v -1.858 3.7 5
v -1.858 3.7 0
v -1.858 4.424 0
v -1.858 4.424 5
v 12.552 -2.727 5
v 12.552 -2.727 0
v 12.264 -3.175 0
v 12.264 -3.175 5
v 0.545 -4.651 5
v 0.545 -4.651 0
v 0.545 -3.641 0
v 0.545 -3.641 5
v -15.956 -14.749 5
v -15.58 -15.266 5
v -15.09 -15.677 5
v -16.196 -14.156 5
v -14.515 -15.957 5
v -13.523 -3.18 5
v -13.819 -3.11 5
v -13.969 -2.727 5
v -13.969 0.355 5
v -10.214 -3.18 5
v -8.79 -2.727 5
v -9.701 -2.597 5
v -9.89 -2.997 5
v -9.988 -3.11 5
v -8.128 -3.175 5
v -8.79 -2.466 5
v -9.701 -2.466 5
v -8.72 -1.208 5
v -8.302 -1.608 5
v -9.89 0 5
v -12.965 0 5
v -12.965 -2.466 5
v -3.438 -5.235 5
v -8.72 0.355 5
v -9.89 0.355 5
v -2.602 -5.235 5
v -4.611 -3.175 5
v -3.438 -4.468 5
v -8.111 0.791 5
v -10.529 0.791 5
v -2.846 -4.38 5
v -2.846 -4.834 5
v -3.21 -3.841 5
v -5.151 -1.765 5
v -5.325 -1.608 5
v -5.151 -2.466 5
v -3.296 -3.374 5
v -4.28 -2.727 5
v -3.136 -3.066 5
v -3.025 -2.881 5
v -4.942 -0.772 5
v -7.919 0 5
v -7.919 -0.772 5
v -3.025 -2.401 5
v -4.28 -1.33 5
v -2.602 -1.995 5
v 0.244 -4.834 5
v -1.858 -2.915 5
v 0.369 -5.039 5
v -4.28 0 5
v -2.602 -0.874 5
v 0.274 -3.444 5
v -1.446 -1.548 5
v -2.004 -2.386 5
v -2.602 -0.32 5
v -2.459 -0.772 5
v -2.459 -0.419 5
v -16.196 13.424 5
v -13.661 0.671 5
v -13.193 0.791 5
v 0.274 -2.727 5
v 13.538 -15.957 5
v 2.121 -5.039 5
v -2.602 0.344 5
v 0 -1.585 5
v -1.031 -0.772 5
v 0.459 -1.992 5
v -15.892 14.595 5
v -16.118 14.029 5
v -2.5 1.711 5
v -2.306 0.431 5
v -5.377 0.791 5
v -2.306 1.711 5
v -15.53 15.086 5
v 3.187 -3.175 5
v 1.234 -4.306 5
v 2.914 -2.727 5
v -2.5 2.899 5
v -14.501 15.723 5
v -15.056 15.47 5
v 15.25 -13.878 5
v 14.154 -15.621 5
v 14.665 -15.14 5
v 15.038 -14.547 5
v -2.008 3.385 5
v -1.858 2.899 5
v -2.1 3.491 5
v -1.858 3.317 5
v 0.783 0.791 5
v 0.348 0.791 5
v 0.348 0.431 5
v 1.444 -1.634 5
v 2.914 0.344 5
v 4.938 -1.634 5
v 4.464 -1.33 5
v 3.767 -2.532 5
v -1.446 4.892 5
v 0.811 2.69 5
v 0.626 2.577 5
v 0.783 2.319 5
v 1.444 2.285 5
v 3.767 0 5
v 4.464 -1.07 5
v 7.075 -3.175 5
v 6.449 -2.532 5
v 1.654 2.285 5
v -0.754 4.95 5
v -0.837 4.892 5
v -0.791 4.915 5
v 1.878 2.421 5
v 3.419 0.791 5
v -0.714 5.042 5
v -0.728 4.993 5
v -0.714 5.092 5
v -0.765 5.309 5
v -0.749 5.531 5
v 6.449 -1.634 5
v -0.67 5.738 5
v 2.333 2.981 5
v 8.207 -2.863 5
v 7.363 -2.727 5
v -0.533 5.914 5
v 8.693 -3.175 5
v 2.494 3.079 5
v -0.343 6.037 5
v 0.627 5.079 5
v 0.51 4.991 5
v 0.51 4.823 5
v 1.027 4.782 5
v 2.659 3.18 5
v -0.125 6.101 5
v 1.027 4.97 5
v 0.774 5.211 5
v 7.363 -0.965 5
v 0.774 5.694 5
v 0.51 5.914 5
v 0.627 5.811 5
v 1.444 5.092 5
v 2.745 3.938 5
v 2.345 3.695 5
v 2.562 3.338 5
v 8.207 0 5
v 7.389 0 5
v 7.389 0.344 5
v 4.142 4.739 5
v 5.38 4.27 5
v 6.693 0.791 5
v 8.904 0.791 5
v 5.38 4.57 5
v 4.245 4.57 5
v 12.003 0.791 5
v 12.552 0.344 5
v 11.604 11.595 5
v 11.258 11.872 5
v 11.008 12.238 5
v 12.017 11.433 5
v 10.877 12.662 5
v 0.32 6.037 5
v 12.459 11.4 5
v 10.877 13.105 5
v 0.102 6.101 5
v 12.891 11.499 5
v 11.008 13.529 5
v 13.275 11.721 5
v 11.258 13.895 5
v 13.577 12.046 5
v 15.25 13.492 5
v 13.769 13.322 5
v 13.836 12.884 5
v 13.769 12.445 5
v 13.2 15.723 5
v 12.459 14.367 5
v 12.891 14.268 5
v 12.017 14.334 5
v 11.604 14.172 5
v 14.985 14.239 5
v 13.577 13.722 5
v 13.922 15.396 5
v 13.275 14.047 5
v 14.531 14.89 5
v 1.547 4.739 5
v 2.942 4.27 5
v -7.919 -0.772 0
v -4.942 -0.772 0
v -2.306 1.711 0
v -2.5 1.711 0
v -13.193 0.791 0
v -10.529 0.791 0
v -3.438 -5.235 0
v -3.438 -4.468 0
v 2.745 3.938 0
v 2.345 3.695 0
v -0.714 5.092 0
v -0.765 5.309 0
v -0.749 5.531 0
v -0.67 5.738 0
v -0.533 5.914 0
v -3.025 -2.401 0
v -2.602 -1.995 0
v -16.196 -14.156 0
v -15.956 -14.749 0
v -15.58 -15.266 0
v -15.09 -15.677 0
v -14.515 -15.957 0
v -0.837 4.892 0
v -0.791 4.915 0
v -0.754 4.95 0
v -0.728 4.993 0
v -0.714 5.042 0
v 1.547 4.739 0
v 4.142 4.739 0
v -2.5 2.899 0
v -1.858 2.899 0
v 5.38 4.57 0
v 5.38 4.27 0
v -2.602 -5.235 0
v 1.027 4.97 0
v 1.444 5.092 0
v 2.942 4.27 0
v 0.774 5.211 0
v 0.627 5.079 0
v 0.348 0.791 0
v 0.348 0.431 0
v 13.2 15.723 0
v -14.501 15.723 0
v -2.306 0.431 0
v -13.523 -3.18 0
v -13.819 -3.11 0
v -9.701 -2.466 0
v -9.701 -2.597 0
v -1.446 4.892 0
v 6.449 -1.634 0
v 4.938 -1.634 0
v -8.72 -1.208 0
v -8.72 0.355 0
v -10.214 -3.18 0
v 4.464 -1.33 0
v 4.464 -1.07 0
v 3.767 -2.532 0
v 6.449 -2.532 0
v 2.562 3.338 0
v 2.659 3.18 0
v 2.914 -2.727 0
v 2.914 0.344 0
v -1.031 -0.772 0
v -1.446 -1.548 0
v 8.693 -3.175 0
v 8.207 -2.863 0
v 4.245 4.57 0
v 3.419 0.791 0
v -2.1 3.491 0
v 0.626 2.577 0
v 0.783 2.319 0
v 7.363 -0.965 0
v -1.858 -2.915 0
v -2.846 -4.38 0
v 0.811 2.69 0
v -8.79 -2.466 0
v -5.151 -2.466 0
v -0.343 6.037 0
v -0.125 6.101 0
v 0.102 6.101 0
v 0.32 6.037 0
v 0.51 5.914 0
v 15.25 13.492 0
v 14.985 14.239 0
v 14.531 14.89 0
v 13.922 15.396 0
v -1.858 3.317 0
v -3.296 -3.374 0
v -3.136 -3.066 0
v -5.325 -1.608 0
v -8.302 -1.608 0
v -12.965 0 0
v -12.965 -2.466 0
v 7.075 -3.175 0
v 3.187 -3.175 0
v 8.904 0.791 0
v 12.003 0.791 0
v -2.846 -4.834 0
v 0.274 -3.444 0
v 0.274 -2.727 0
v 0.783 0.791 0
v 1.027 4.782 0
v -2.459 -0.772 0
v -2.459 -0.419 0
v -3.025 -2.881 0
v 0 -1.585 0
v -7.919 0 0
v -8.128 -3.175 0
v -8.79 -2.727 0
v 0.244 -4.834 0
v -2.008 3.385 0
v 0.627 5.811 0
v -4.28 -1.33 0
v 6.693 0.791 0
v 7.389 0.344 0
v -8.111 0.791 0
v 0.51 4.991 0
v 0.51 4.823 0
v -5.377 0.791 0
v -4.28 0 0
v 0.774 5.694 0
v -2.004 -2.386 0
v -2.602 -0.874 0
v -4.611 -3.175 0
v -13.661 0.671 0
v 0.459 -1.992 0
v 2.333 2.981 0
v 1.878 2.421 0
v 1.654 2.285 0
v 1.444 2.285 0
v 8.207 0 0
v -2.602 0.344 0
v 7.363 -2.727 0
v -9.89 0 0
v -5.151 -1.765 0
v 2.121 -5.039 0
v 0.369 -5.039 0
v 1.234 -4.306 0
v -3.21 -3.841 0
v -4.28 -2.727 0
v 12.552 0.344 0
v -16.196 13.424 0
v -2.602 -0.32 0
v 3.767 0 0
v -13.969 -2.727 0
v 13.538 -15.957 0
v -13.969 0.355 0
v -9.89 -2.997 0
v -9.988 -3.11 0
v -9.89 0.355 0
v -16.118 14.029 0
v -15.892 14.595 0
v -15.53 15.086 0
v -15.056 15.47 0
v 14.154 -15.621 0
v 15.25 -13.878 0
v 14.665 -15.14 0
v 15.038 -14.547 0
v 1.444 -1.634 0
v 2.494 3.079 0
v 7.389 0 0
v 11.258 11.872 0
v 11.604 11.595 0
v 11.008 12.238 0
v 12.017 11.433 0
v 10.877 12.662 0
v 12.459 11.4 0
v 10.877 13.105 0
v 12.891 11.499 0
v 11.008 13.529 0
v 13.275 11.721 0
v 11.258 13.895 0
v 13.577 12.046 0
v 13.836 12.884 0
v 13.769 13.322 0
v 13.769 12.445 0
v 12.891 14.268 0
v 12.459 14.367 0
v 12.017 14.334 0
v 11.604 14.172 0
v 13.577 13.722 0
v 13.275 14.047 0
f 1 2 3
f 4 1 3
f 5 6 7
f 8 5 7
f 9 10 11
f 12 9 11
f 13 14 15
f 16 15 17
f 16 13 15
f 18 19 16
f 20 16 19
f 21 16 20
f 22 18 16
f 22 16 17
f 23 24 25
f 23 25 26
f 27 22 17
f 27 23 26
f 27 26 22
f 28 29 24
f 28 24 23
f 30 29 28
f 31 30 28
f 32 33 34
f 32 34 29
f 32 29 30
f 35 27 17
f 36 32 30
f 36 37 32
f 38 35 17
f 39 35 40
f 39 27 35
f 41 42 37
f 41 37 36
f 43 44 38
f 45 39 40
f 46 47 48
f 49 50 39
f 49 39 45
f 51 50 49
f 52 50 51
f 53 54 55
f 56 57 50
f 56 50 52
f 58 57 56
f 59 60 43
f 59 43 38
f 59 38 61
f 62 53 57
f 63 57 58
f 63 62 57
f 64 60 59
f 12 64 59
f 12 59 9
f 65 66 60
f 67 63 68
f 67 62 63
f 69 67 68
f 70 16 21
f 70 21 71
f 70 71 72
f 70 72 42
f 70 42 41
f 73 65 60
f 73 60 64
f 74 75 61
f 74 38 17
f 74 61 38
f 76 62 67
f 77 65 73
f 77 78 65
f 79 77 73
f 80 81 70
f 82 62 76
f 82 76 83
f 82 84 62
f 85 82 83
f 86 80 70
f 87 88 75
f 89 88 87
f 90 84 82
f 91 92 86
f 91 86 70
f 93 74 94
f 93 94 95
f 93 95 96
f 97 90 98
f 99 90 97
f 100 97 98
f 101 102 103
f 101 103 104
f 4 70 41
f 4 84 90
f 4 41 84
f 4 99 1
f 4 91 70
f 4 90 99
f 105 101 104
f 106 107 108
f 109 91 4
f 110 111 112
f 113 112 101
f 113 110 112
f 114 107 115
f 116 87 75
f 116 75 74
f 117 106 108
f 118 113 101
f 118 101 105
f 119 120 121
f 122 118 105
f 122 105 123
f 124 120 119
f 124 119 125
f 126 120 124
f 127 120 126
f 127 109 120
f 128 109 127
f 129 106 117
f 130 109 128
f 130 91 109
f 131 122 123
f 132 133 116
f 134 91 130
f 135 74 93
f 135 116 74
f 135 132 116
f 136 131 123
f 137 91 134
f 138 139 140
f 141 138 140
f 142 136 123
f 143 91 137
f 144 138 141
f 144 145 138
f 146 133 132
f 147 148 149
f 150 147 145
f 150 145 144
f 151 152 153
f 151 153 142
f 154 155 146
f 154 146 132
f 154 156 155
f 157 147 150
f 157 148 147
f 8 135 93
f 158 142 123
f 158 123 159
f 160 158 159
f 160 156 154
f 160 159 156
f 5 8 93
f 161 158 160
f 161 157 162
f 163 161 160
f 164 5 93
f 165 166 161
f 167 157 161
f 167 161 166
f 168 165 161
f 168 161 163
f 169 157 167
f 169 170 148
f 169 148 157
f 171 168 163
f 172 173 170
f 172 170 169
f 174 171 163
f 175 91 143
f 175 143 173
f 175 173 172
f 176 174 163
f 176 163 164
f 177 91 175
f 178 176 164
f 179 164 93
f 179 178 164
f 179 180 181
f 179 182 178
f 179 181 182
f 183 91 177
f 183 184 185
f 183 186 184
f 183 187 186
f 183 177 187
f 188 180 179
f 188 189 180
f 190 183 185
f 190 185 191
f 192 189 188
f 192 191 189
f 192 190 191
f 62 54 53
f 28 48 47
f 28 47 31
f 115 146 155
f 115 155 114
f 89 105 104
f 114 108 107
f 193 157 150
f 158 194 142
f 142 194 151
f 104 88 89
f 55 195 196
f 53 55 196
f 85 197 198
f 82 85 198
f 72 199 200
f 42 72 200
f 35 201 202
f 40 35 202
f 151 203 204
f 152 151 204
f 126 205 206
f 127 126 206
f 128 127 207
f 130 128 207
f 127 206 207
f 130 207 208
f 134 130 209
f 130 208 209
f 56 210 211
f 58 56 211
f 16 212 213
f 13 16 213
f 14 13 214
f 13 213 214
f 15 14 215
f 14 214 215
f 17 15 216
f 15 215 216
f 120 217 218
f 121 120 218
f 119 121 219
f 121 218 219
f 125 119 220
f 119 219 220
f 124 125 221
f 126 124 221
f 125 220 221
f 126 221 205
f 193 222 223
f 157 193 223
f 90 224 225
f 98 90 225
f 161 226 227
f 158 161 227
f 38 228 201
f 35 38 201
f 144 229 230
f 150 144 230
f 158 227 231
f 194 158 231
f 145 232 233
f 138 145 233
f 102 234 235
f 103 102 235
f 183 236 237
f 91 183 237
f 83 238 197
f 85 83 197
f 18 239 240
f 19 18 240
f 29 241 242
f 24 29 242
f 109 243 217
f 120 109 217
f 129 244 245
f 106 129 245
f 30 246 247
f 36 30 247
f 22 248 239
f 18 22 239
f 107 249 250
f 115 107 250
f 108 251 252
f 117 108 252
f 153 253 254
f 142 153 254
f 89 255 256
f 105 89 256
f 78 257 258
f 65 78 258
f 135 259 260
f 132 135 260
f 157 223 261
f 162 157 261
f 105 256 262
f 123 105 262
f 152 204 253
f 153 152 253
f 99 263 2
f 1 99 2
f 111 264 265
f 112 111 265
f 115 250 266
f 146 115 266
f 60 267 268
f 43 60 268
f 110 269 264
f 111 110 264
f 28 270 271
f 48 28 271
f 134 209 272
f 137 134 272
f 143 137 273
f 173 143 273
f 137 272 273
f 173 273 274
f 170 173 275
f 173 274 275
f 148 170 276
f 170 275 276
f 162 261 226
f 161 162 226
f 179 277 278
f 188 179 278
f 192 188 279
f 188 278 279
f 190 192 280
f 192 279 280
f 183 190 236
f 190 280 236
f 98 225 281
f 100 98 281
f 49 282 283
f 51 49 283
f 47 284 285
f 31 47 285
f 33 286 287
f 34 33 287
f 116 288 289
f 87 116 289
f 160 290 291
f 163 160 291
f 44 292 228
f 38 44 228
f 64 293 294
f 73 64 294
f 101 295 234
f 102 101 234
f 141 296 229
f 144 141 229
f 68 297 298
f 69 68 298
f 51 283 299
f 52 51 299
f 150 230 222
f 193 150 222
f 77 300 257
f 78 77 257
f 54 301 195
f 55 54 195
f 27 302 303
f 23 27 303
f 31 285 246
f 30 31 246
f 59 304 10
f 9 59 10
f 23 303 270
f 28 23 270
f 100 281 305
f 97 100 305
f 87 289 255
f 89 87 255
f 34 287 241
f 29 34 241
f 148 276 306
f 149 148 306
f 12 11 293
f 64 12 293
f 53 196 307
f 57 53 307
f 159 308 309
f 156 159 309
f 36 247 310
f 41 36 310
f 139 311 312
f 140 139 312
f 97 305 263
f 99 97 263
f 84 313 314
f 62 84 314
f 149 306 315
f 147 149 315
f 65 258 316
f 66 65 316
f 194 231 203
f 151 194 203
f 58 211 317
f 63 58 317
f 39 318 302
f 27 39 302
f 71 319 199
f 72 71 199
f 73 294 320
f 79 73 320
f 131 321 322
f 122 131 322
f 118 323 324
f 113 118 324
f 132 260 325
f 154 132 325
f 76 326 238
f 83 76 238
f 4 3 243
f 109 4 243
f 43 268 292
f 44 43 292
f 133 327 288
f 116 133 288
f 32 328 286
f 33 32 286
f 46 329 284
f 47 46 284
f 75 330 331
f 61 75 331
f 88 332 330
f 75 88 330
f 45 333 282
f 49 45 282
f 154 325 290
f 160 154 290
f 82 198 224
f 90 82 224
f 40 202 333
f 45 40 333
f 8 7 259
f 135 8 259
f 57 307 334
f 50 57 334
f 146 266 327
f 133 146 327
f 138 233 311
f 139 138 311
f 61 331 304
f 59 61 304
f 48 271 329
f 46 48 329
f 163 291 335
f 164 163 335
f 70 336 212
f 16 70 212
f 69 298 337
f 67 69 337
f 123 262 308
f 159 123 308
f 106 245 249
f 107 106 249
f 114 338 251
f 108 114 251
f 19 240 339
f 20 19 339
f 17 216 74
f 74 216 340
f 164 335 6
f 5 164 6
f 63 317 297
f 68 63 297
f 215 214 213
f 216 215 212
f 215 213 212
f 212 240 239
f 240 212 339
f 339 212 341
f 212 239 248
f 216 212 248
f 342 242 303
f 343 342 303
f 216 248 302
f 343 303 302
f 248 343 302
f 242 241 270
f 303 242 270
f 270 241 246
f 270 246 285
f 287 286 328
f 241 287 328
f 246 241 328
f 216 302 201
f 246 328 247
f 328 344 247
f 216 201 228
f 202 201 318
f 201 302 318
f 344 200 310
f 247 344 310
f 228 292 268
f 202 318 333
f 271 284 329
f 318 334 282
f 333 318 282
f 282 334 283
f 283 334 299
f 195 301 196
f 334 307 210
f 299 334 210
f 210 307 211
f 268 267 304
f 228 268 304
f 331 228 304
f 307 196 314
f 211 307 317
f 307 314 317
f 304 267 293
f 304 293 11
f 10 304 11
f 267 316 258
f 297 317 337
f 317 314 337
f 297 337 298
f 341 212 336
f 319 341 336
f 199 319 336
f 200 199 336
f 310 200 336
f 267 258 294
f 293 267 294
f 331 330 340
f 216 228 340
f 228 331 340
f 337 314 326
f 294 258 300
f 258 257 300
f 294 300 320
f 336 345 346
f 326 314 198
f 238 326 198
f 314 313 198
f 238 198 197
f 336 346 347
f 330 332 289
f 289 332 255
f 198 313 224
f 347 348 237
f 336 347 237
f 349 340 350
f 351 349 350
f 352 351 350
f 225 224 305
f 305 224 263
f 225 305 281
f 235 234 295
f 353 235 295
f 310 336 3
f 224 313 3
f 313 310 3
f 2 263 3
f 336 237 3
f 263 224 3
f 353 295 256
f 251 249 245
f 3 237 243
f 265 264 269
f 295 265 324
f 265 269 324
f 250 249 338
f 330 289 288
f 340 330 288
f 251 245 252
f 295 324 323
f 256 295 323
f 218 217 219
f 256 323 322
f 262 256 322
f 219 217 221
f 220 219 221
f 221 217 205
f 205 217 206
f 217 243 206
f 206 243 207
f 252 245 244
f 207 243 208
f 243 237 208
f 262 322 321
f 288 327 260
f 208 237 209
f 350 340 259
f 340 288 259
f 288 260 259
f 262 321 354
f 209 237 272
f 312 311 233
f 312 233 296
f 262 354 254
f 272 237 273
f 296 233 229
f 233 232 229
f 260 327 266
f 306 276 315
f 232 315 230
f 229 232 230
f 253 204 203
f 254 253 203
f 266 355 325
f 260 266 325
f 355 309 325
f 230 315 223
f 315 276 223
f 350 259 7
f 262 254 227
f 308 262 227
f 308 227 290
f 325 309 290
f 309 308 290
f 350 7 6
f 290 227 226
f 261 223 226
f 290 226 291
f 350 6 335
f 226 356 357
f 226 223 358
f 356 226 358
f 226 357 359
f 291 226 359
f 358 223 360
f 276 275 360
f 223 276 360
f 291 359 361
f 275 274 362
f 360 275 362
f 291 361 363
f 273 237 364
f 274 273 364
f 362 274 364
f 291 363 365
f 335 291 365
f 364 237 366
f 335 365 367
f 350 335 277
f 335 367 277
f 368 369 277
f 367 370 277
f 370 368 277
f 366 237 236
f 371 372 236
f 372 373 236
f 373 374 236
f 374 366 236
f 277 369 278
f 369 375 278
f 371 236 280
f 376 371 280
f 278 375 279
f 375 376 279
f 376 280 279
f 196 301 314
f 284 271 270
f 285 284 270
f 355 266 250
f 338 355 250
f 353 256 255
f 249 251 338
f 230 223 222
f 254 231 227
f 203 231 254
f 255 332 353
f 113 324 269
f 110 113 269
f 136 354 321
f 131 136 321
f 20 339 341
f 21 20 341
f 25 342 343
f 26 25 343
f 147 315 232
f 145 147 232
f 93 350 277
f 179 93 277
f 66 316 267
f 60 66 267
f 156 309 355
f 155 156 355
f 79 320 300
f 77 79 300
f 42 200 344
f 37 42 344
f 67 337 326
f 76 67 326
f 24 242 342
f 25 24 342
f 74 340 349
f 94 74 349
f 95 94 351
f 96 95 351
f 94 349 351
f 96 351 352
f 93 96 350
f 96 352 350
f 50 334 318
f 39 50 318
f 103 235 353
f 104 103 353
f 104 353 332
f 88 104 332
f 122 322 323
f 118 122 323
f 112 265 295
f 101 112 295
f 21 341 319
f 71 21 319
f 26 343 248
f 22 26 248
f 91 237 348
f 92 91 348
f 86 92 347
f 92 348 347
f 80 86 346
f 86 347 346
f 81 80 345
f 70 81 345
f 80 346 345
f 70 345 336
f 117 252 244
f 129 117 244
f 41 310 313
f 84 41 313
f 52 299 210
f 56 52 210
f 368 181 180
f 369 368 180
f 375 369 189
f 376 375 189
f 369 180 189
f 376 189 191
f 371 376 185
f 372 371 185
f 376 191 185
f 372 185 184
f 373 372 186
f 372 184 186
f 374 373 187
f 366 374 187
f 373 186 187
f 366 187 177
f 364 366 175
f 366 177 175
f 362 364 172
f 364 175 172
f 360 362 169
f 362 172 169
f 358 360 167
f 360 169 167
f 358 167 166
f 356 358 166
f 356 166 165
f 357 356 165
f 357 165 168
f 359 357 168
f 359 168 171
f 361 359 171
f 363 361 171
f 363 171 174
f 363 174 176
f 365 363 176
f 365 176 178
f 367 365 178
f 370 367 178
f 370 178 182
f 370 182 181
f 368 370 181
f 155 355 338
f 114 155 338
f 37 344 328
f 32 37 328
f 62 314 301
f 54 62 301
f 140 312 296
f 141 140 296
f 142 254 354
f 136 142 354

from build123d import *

# Parameters (mm, degrees)
F1_DEPTH = 5
F2_R     = 1.487565
F3_DEPTH = 25


with BuildPart() as f1:
    # F0 (on Top) → F1 (new body)
    with BuildSketch(Plane.XY):
        with BuildLine():
            ThreePointArc((-14.500521, 15.723383), (-15.72616, 14.852099), (-16.19577, 13.423536))
            Line((-16.19577, 13.423536), (-16.19577, -14.155729))
            ThreePointArc((-16.19577, -14.155729), (-15.580113, -15.265987), (-14.515248, -15.957195))
            Line((-14.515248, -15.957195), (13.538033, -15.957195))
            ThreePointArc((13.538033, -15.957195), (14.664759, -15.140462), (15.249531, -13.877685))
            Line((15.249531, -13.877685), (15.249531, 13.492324))
            ThreePointArc((15.249531, 13.492324), (14.531055, 14.889514), (13.19951, 15.723383))
            Line((13.19951, 15.723383), (-14.500521, 15.723383))
        make_face()
        Polygon((-9.889765, 0), (-12.746189, 0), (-12.965441, 0), (-12.965441, -0.315834), (-12.965441, -2.466221), (-9.700684, -2.466221), (-9.700684, -2.596811), (-9.889765, -2.997288), (-9.987982, -3.110466), (-10.214339, -3.180114), (-13.522626, -3.180114), (-13.818631, -3.110466), (-13.968735, -2.727133), (-13.968735, 0.355315), (-13.660931, 0.671027), (-13.192589, 0.790616), (-10.528548, 0.790616), (-9.889765, 0.355315), align=None, mode=Mode.SUBTRACT)
        Polygon((-8.720032, 0.355315), (-8.110611, 0.790616), (-5.376921, 0.790616), (-4.279962, 0), (-7.919079, 0), (-7.919079, -0.77241), (-4.941619, -0.77241), (-4.279962, -1.329595), (-4.279962, -2.727133), (-4.610791, -3.175272), (-8.128023, -3.175272), (-8.789681, -2.727133), (-8.789681, -2.466221), (-5.150564, -2.466221), (-5.150564, -1.764896), (-5.324685, -1.608188), (-8.302143, -1.608188), (-8.720032, -1.207711), (-8.720032, 0), align=None, mode=Mode.SUBTRACT)
        Polygon((4.463568, -1.329595), (4.463568, -1.069831), (7.363056, -0.965359), (7.363056, -2.727133), (7.075374, -3.175272), (3.186837, -3.175272), (2.913897, -2.727133), (2.913897, 0.343786), (3.418846, 0.790616), (6.692736, 0.790616), (7.388791, 0.343786), (7.388791, 0), (3.767087, 0), (3.767087, -2.532442), (6.448541, -2.532442), (6.448541, -1.634477), (4.9385, -1.634477), align=None, mode=Mode.SUBTRACT)
        Polygon((8.903638, 0.790616), (12.002981, 0.790616), (12.551844, 0.343786), (12.551844, -2.727133), (12.264162, -3.175272), (8.693178, -3.175272), (8.207156, -2.863271), (8.207156, 0), align=None, mode=Mode.SUBTRACT)
        with BuildLine():
            Line((0.510285, 4.991175), (0.510285, 4.822795))
            Line((0.510285, 4.822795), (1.027232, 4.781501))
            Line((1.027232, 4.781501), (1.027232, 4.970423))
            Line((1.027232, 4.970423), (1.443637, 5.0924))
            Line((1.443637, 5.0924), (1.547077, 4.739275))
            Line((1.547077, 4.739275), (4.141693, 4.739275))
            Line((4.141693, 4.739275), (4.244784, 4.57001))
            Line((4.244784, 4.57001), (5.379676, 4.57001))
            Line((5.379676, 4.57001), (5.379676, 4.269563))
            Line((5.379676, 4.269563), (4.282718, 4.269563))
            Line((4.282718, 4.269563), (2.941991, 4.269563))
            Line((2.941991, 4.269563), (2.744667, 3.93836))
            Line((2.744667, 3.93836), (2.345195, 3.69506))
            Line((2.345195, 3.69506), (2.562487, 3.338289))
            Line((2.562487, 3.338289), (2.658973, 3.179869))
            Line((2.658973, 3.179869), (2.493863, 3.079309))
            Line((2.493863, 3.079309), (2.332569, 2.981072))
            Line((2.332569, 2.981072), (1.877723, 2.421154))
            Line((1.877723, 2.421154), (1.6535, 2.284591))
            Line((1.6535, 2.284591), (1.443637, 2.284591))
            Line((1.443637, 2.284591), (0.811452, 2.69042))
            Line((0.811452, 2.69042), (0.625802, 2.57735))
            Line((0.625802, 2.57735), (0.782898, 2.319415))
            Line((0.782898, 2.319415), (0.782898, 0.790616))
            Line((0.782898, 0.790616), (0.347854, 0.790616))
            Line((0.347854, 0.790616), (0.347854, 0.430846))
            Line((0.347854, 0.430846), (1.443637, -1.634477))
            Line((1.443637, -1.634477), (1.23433, -4.306218))
            Line((1.23433, -4.306218), (2.120807, -5.039395))
            Line((2.120807, -5.039395), (0.369284, -5.039395))
            Line((0.369284, -5.039395), (0.244222, -4.834056))
            Line((0.244222, -4.834056), (0.544849, -4.650959))
            Line((0.544849, -4.650959), (0.544849, -3.641361))
            Line((0.544849, -3.641361), (0.273981, -3.444366))
            Line((0.273981, -3.444366), (0.273981, -2.727133))
            Line((0.273981, -2.727133), (0.458664, -1.99153))
            Line((0.458664, -1.99153), (0, -1.585228))
            Line((0, -1.585228), (-1.031109, -0.77241))
            Line((-1.031109, -0.77241), (-1.445959, -1.548292))
            Line((-1.445959, -1.548292), (-2.003771, -2.385519))
            Line((-2.003771, -2.385519), (-1.858417, -2.914943))
            Line((-1.858417, -2.914943), (-2.845868, -4.380091))
            Line((-2.845868, -4.380091), (-2.845868, -4.834056))
            Line((-2.845868, -4.834056), (-2.601957, -5.234533))
            Line((-2.601957, -5.234533), (-3.437877, -5.234533))
            Line((-3.437877, -5.234533), (-3.437877, -4.86888))
            Line((-3.437877, -4.86888), (-3.437877, -4.468403))
            Line((-3.437877, -4.468403), (-3.209849, -3.841491))
            Line((-3.209849, -3.841491), (-3.296034, -3.373629))
            Line((-3.296034, -3.373629), (-3.135976, -3.065825))
            Line((-3.135976, -3.065825), (-3.025166, -2.881142))
            Line((-3.025166, -2.881142), (-3.025166, -2.400967))
            Line((-3.025166, -2.400967), (-2.601957, -1.994665))
            Line((-2.601957, -1.994665), (-2.601957, -0.874258))
            Line((-2.601957, -0.874258), (-2.458807, -0.77241))
            Line((-2.458807, -0.77241), (-2.458807, -0.418708))
            Line((-2.458807, -0.418708), (-2.601957, -0.32021))
            Line((-2.601957, -0.32021), (-2.601957, 0.343786))
            Line((-2.601957, 0.343786), (-2.305952, 0.430846))
            Line((-2.305952, 0.430846), (-2.305952, 1.710631))
            Line((-2.305952, 1.710631), (-2.500045, 1.710631))
            Line((-2.500045, 1.710631), (-2.500045, 2.899405))
            Line((-2.500045, 2.899405), (-1.858417, 2.899405))
            Line((-1.858417, 2.899405), (-1.858417, 3.317294))
            Line((-1.858417, 3.317294), (-2.007655, 3.385334))
            Line((-2.007655, 3.385334), (-2.099568, 3.491414))
            Line((-2.099568, 3.491414), (-1.858417, 3.700359))
            Line((-1.858417, 3.700359), (-1.858417, 4.424379))
            Line((-1.858417, 4.424379), (-1.445959, 4.892242))
            Line((-1.445959, 4.892242), (-0.836507, 4.892242))
            ThreePointArc((-0.836507, 4.892242), (-0.739639, 4.970476), (-0.714366, 5.0924))
            ThreePointArc((-0.714366, 5.0924), (-0.749437, 5.530727), (-0.533184, 5.913604))
            ThreePointArc((-0.533184, 5.913604), (-0.011449, 6.109638), (0.510285, 5.913604))
            Line((0.510285, 5.913604), (0.627419, 5.811112))
            Line((0.627419, 5.811112), (0.773836, 5.693978))
            Line((0.773836, 5.693978), (0.773836, 5.525598))
            Line((0.773836, 5.525598), (0.773836, 5.357218))
            Line((0.773836, 5.357218), (0.773836, 5.210801))
            Line((0.773836, 5.210801), (0.627419, 5.079025))
            Line((0.627419, 5.079025), (0.510285, 4.991175))
        make_face(mode=Mode.SUBTRACT)
    extrude(amount=F1_DEPTH)

    # F2 (on face) → F3 (cut)
    with BuildSketch(Plane.XY.offset(5)):
        with Locations((12.347989, 12.883592)):
            Circle(F2_R)
    extrude(amount=-F3_DEPTH, mode=Mode.SUBTRACT)


solid = f1.part
